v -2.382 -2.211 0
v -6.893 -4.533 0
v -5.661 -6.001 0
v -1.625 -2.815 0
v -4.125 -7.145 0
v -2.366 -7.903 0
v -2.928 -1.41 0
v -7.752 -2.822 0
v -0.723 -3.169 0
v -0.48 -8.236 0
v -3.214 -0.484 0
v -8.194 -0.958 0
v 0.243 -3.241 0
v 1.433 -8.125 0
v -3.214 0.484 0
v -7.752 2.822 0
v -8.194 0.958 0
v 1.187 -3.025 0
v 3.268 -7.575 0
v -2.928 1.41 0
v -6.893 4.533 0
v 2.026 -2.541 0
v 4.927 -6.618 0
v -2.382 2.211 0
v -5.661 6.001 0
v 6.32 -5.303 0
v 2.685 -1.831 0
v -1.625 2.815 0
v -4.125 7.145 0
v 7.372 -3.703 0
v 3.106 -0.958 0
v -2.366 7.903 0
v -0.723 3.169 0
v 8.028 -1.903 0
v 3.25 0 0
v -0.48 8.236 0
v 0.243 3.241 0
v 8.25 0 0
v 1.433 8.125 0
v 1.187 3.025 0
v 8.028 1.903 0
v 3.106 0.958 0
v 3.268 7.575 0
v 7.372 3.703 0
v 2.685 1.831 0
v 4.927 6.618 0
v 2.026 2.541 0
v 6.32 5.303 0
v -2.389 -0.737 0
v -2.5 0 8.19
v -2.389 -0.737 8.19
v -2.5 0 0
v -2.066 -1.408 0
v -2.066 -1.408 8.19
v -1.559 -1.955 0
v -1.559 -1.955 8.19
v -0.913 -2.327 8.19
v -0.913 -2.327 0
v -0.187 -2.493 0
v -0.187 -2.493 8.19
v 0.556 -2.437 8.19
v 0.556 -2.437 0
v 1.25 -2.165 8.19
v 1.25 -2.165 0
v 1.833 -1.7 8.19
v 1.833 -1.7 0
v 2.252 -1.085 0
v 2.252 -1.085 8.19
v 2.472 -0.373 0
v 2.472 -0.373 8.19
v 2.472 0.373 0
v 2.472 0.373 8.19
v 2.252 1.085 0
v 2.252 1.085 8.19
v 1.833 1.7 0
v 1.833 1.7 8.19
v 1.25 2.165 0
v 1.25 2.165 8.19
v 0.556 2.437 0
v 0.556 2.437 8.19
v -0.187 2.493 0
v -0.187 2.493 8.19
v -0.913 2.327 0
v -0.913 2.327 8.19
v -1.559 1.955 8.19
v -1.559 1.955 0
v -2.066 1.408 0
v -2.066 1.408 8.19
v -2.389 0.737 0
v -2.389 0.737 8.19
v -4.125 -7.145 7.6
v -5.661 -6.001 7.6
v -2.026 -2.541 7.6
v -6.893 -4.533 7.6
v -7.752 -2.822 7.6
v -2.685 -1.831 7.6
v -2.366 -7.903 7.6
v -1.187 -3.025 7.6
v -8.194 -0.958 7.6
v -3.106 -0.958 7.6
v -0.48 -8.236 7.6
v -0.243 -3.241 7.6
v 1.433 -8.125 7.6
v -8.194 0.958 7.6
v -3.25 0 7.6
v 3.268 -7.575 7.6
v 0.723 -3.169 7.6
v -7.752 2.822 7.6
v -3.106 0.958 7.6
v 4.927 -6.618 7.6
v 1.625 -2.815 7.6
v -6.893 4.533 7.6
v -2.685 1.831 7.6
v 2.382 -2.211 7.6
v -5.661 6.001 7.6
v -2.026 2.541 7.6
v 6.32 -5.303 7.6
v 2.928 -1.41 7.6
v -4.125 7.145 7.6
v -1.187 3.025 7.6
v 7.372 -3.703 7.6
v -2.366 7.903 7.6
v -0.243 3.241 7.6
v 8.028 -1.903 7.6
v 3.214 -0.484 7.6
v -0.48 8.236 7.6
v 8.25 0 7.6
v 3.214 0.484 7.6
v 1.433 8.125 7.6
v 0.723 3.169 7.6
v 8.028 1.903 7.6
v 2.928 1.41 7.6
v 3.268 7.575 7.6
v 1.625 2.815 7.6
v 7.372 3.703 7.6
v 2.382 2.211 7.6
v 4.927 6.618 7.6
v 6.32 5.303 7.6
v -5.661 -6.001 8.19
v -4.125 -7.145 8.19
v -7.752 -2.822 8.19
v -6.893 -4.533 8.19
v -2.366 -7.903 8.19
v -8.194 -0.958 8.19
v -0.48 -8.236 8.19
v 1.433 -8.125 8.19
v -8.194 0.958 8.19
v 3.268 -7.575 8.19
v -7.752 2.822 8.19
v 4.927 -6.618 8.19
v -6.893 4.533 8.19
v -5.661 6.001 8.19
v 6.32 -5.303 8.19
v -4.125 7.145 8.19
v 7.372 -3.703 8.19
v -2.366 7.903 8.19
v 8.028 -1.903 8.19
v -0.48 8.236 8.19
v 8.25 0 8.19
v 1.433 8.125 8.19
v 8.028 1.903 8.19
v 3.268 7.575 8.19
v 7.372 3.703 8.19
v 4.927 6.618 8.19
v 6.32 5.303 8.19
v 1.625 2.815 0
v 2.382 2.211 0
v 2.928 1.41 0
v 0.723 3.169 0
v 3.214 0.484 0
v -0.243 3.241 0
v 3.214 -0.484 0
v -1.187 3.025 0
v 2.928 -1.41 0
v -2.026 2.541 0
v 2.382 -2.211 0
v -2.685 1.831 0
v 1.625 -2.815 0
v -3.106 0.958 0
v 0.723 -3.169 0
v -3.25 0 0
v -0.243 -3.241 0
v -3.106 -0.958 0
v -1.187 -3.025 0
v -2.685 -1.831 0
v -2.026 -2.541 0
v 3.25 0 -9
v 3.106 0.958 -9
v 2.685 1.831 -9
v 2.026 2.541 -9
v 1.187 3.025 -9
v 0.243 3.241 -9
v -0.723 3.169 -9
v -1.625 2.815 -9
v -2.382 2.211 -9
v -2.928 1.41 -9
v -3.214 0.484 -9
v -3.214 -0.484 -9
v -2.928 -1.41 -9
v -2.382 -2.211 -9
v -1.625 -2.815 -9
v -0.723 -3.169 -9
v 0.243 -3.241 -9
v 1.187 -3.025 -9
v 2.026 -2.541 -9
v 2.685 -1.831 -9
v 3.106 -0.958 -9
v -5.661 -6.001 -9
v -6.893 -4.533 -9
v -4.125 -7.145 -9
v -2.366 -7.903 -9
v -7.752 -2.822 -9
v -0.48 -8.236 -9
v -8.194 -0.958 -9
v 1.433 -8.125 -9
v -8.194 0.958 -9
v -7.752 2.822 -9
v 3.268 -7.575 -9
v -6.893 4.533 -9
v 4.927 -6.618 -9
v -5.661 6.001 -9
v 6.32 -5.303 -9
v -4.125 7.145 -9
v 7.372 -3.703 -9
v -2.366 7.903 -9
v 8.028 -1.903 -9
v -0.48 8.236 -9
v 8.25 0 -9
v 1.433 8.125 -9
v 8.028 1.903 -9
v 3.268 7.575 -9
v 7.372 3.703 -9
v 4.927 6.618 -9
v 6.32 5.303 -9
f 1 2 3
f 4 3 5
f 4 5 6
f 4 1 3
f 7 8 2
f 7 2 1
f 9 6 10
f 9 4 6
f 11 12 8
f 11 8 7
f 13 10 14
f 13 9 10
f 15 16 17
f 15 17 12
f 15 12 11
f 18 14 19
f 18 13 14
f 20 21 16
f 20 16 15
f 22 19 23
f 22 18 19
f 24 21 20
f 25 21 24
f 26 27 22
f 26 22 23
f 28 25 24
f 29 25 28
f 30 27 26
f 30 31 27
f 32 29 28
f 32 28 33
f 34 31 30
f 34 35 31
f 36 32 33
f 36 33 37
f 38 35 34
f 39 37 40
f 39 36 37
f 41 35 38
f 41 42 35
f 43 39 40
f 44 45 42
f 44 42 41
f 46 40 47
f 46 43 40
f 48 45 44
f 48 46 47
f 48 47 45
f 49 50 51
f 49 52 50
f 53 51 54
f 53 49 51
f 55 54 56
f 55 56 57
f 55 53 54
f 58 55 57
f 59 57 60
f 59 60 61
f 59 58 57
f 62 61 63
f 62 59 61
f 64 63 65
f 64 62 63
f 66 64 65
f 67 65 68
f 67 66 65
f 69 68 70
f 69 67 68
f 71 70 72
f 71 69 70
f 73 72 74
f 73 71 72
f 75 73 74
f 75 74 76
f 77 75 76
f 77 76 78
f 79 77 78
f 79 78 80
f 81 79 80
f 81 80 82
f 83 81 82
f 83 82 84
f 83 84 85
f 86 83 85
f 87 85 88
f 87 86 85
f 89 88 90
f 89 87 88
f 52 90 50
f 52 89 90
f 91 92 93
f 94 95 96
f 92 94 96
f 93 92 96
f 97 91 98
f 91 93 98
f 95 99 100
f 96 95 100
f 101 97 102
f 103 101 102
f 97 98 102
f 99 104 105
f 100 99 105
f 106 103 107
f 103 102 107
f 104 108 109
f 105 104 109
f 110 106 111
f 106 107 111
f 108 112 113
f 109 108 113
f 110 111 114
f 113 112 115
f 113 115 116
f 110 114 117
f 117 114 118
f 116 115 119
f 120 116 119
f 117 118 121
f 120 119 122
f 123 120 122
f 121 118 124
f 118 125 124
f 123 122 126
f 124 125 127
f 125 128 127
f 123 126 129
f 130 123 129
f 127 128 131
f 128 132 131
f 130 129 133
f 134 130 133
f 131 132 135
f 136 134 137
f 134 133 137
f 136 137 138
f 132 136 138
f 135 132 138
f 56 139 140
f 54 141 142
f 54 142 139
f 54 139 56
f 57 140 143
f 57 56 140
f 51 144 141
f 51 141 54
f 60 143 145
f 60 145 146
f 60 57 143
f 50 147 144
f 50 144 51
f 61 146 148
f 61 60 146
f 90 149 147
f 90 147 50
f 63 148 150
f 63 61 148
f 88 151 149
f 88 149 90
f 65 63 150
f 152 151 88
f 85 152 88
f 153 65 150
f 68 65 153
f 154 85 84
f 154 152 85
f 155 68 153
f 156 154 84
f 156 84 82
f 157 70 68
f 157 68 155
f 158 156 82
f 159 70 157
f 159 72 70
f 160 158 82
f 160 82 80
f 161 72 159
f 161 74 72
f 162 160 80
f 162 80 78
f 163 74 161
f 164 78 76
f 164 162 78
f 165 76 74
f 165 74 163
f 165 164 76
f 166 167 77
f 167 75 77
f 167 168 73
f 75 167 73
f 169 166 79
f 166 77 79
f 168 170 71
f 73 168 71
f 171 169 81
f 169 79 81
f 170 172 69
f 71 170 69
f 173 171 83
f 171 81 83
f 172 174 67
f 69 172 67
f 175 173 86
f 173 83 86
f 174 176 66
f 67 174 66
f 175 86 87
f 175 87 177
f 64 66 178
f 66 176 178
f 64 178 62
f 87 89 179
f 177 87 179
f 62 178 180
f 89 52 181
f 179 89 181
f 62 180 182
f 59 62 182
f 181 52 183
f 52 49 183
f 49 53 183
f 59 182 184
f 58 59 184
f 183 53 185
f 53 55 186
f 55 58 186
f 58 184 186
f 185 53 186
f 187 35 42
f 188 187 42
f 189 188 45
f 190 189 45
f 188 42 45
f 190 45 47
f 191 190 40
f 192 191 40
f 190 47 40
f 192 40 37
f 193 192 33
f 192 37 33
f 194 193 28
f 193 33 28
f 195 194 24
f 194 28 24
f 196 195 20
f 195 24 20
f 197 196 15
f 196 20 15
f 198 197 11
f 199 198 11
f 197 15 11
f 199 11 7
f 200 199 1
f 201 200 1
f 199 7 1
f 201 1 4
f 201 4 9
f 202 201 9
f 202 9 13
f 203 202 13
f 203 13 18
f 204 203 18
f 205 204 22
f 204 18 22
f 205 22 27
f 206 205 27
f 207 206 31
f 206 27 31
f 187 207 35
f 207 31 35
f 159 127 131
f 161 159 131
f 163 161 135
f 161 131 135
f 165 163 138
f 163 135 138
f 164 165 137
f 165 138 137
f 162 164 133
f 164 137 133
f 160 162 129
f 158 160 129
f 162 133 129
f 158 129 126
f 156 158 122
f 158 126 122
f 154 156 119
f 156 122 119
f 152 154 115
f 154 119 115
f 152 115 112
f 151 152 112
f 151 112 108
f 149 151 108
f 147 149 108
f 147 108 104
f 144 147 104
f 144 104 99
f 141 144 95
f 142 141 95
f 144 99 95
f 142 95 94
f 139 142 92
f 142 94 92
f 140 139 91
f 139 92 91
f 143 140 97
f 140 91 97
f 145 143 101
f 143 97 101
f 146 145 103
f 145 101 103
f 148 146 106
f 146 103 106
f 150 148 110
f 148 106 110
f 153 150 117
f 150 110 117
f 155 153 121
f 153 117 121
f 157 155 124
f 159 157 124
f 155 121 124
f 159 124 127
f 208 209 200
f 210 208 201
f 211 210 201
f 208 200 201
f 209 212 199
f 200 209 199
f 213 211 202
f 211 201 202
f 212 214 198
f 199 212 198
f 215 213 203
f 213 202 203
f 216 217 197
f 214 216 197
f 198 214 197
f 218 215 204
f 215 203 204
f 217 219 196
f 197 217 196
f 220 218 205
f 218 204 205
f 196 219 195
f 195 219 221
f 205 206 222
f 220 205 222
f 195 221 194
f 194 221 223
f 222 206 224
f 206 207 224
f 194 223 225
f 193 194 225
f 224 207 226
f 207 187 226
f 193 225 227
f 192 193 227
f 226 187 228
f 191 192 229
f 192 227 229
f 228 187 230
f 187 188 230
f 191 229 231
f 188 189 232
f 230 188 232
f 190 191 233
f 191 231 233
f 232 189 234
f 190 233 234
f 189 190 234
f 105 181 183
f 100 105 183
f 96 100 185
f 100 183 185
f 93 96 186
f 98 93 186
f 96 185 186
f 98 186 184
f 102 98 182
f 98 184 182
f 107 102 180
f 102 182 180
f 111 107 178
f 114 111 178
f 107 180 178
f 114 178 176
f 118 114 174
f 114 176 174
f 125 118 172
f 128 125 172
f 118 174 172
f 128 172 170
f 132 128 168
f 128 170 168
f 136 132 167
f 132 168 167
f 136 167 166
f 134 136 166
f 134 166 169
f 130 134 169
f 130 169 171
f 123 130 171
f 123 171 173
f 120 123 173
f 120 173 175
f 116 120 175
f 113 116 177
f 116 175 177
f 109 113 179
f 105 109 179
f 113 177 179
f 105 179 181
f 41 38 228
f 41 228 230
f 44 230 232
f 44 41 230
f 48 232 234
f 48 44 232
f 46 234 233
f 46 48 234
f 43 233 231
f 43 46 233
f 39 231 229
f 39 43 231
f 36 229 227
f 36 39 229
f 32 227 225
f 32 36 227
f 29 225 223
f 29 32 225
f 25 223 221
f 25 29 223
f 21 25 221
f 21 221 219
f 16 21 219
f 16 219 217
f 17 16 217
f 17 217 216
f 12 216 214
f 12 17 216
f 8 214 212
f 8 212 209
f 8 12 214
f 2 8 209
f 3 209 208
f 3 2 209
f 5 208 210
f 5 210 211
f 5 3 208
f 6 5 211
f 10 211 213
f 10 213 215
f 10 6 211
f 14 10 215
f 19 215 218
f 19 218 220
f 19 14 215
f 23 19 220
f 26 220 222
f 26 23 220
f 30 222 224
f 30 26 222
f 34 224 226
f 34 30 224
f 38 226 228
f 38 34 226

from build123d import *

# Parameters (mm, degrees)
SKETCH1_R           = 3.25
SKETCH1_R_2         = 2.5
BOSS_EXTRUDE1_DEPTH = 7.6
SKETCH1_3_R         = 8.25
SKETCH1_3_R_2       = 3.25
BOSS_EXTRUDE2_DEPTH = 9
SKETCH2_R           = 8.25
SKETCH2_R_2         = 2.5
BOSS_EXTRUDE3_DEPTH = 0.59


with BuildPart() as part:
    # Sketch1 → Boss-Extrude1 (new body)
    with BuildSketch(Plane.XY):
        with Locations(Location((0, 0, 0), (0, 0, 180))):
            Circle(SKETCH1_R)
        with Locations(Location((0, 0, 0), (0, 0, 180))):
            Circle(SKETCH1_R_2, mode=Mode.SUBTRACT)
    extrude(amount=BOSS_EXTRUDE1_DEPTH)

    # Sketch2 → Boss-Extrude3 (add)
    with BuildSketch(Plane.XY.offset(7.6)):
        Circle(SKETCH2_R)
        with Locations(Location((0, 0, 0), (0, 0, 180))):
            Circle(SKETCH2_R_2, mode=Mode.SUBTRACT)
    extrude(amount=BOSS_EXTRUDE3_DEPTH)


with BuildPart() as body_2:
    # Sketch1<3> → Boss-Extrude2 (new body)
    with BuildSketch(Plane.XY):
        Circle(SKETCH1_3_R)
        Circle(SKETCH1_3_R_2, mode=Mode.SUBTRACT)
    extrude(amount=-BOSS_EXTRUDE2_DEPTH)


solid = Compound([part.part, body_2.part])
